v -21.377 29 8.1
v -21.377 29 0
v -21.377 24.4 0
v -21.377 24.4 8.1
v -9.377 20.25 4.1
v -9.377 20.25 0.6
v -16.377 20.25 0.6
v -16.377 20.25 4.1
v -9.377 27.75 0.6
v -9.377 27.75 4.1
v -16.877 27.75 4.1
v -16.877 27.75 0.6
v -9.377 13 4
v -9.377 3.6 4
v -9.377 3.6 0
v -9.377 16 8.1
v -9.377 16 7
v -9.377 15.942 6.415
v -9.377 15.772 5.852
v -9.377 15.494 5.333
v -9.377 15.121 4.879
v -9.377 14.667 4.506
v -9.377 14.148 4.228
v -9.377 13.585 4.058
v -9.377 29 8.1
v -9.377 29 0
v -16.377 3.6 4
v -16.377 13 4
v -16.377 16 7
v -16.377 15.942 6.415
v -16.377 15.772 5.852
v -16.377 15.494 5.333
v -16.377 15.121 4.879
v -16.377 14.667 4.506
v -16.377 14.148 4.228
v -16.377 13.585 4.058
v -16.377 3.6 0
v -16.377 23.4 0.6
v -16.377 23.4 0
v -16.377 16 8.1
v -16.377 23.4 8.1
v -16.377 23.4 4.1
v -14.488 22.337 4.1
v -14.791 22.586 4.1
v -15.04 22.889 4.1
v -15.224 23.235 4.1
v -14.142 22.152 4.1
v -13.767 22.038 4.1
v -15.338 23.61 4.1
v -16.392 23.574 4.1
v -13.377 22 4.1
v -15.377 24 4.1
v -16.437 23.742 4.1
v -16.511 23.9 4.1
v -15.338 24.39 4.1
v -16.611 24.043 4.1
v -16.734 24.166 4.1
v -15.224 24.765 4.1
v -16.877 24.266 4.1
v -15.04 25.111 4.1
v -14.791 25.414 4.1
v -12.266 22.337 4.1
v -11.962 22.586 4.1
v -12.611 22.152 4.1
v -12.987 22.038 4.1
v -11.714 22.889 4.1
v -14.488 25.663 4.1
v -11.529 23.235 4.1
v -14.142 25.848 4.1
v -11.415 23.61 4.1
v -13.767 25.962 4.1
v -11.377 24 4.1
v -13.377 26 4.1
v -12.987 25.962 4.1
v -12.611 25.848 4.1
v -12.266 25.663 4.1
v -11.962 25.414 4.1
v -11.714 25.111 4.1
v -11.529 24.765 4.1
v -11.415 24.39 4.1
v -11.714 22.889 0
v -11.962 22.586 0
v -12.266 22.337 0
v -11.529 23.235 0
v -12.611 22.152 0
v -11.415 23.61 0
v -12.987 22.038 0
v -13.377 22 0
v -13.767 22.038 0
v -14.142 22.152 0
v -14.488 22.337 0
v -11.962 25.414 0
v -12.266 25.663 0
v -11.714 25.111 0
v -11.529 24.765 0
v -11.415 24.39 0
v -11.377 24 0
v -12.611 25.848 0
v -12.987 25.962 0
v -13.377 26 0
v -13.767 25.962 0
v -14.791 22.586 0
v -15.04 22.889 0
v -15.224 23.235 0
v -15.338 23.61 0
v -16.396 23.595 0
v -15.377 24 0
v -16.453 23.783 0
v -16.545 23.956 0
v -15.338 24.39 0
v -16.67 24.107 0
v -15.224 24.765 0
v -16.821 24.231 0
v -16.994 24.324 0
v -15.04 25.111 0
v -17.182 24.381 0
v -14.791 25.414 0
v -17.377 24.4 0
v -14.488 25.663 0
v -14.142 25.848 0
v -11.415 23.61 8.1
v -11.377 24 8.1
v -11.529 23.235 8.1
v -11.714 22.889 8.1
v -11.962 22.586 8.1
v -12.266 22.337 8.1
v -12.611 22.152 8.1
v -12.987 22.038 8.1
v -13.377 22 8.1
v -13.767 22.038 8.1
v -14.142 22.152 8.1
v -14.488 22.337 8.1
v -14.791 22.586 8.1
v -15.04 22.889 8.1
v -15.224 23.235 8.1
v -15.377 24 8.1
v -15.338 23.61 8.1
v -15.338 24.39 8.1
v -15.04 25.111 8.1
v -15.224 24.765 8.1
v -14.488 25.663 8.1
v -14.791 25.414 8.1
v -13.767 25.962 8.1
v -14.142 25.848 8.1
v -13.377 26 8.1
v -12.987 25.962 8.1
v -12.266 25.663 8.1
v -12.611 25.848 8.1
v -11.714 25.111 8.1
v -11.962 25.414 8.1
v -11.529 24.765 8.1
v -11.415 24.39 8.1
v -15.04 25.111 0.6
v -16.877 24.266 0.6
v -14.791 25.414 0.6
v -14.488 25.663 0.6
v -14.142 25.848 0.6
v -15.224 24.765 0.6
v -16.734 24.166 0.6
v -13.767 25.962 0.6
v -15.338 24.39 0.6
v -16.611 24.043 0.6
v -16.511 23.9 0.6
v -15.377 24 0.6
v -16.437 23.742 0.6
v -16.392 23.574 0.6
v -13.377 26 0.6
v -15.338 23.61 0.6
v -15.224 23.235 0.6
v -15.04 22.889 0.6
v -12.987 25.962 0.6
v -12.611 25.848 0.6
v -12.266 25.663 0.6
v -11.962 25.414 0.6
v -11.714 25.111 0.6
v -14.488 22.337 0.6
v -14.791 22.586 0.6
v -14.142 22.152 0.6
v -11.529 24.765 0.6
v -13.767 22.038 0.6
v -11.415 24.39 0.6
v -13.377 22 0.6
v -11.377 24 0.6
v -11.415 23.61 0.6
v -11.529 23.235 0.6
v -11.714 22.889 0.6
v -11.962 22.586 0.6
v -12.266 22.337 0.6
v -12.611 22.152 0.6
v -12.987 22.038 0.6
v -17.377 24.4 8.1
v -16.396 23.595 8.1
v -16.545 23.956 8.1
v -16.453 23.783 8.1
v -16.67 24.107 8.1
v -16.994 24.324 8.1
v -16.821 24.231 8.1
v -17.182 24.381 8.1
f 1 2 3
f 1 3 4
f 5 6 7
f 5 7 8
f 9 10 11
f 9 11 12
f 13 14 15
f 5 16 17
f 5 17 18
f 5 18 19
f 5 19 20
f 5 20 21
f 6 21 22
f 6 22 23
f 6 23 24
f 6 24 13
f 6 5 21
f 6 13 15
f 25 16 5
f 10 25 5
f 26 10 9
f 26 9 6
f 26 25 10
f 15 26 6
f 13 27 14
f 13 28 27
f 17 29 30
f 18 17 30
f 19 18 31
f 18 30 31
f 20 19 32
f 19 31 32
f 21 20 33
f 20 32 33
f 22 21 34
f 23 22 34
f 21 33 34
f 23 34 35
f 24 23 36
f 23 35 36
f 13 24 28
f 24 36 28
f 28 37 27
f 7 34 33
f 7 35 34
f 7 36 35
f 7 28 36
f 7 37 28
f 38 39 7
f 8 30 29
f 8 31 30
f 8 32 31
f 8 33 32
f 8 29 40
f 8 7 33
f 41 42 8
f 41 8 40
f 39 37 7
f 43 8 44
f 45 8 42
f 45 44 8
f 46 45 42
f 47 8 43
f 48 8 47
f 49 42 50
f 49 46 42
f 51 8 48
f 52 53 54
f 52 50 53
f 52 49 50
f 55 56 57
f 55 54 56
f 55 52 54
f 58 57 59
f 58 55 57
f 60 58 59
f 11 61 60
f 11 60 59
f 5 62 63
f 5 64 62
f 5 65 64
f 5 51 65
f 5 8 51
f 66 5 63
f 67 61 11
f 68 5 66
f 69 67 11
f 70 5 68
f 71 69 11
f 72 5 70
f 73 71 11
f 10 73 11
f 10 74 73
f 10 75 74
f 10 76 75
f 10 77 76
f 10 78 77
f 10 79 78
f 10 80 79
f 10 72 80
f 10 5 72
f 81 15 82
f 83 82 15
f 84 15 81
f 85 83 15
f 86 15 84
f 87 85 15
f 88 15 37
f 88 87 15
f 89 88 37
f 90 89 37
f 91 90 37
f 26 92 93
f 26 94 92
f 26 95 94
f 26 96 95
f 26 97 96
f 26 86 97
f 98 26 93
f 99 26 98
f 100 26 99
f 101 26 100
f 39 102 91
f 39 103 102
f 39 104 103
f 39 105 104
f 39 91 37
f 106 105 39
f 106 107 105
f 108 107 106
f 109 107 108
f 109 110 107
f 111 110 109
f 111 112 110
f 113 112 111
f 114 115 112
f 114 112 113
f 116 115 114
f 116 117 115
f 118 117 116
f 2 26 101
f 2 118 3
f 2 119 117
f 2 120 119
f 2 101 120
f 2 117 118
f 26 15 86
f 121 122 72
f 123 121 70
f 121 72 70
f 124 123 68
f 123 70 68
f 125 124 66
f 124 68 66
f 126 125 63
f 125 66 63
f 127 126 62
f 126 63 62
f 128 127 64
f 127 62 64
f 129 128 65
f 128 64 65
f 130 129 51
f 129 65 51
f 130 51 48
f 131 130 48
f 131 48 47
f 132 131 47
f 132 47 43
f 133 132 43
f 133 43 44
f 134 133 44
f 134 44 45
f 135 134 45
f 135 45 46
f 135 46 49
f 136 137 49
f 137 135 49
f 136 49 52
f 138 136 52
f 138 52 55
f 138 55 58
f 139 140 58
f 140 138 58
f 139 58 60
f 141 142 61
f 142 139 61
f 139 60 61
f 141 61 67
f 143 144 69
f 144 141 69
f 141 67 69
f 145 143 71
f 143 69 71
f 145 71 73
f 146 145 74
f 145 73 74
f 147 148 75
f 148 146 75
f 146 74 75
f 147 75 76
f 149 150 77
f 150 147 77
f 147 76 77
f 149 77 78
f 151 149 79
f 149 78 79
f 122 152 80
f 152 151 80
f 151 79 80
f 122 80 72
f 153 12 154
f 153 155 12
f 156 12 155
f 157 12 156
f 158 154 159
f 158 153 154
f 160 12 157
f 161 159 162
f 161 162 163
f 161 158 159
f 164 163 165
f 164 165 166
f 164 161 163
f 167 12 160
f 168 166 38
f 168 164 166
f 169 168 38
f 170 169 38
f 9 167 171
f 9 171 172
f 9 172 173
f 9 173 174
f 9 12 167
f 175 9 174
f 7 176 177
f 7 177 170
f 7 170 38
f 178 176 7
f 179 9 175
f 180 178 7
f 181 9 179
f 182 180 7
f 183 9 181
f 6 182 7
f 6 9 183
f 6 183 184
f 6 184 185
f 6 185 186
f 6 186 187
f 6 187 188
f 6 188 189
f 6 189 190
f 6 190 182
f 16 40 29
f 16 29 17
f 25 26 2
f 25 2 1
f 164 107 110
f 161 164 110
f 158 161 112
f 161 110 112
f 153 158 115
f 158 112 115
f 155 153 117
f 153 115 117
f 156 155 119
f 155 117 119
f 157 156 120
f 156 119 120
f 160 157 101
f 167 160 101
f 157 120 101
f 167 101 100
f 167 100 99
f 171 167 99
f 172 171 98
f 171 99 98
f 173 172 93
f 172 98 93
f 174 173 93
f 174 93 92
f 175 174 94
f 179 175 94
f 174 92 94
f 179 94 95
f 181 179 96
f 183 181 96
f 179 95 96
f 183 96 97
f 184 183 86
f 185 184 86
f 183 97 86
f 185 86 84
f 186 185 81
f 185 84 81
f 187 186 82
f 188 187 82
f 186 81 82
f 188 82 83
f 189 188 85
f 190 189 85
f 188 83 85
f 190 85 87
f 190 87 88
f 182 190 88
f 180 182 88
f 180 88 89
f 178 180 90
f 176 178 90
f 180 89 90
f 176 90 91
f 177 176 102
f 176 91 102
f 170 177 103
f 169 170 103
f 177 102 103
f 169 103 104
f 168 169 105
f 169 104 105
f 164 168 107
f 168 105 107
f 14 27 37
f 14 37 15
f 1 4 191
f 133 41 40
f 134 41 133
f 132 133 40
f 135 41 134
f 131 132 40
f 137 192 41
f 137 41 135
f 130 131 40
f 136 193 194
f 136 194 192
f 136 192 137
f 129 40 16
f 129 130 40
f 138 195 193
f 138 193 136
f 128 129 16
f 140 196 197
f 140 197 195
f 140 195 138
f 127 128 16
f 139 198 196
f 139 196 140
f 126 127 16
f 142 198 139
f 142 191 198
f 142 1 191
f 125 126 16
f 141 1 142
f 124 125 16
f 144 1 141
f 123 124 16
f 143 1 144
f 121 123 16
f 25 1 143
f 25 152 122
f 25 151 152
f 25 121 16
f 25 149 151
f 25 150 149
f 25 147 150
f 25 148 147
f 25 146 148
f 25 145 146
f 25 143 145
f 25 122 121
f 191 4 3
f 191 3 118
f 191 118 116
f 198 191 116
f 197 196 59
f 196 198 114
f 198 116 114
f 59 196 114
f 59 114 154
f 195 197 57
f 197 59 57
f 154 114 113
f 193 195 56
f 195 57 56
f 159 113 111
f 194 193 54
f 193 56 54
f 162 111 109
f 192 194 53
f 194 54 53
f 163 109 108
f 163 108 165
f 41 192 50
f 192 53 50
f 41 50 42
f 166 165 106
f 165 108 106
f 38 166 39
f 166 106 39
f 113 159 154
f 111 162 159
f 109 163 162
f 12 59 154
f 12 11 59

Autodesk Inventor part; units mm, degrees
ref_plane "YZ Plane" through (0, 0, 0) normal (1, 0, 0) x (0, 1, 0)
sketch "Sketch1" plane through (0, 0, 0) normal (0, 0, 1) x (1, 0, 0)
  line L0 (5.8439, -14.5) -> (6.8, -14.5) projected
  line L1 (6.8, -5.5) -> (6.8, -14.5) projected
  line L2 (6.8, -5.5) -> (5.8439, -5.5) projected
  arc A0 (5.8439, -3.1) -> (5.8439, -5.5) centre (4, -4.3) ccw projected
  line L3 (5.8439, -3.1) -> (6.8, -3.1) projected
  line L4 (6.8, 0) -> (6.8, -3.1) projected
  line L5 (0, 0) -> (6.8, 0) projected
  line L6 (0, -20) -> (0, 0) projected
  line L7 (0, -20) -> (6.8, -20) projected
  line L8 (6.8, -16.9) -> (6.8, -20) projected
  line L9 (6.8, -16.9) -> (5.8439, -16.9) projected
  arc A1 (5.8439, -14.5) -> (5.8439, -16.9) centre (4, -15.7) ccw projected
  line L10 (-47.1, -14.5) -> (-46.1439, -14.5) projected
  arc A2 (-46.1439, -16.9) -> (-46.1439, -14.5) centre (-44.3, -15.7) ccw projected
  line L11 (-46.1439, -16.9) -> (-47.1, -16.9) projected
  line L12 (-47.1, -16.9) -> (-47.1, -20) projected
  line L13 (-40.3, -20) -> (-47.1, -20) projected
  line L14 (-40.3, 0) -> (-40.3, -20) projected
  line L15 (-40.3, 0) -> (-47.1, 0) projected
  line L16 (-47.1, 0) -> (-47.1, -3.1) projected
  line L17 (-47.1, -3.1) -> (-46.1439, -3.1) projected
  arc A3 (-46.1439, -5.5) -> (-46.1439, -3.1) centre (-44.3, -4.3) ccw projected
  line L18 (-46.1439, -5.5) -> (-47.1, -5.5) projected
  line L19 (-47.1, -5.5) -> (-47.1, -14.5) projected
extrude "Extrusion1" add sketch "Sketch1" along normal blind 4
sketch "Sketch2" plane through (0, 0, 0) normal (0, 1, 0) x (1, 0, 0)
  line L0 (0, 0) -> (6.8, 0) projected
  line L1 (0, 0) -> (0, -4) projected
  line L2 (6.8, -4) -> (0, -4) projected
  line L3 (6.8, 0) -> (6.8, -4) projected
  line L4 (-47.1, 0) -> (-47.1, -4) projected
  line L5 (-40.3, -4) -> (-47.1, -4) projected
  line L6 (6.8, 0) -> (-47.1, 0)
  line L7 (-47.1, 0) -> (-47.1, -4)
  line L8 (-47.1, -4) -> (6.8, -4)
  line L9 (6.8, -4) -> (6.8, 0)
extrude "Extrusion2" add sketch "Sketch2" along normal blind 4 contours L1 L8 L5 L4 L6
sketch "Sketch3" plane through (0, 0, 4) normal (1, 0, 0) x (0, 0, -1)
  line L0 (4, 0) -> (0, 0) projected
  line L1 (4, 4) -> (4, 0) projected
  line L2 (0, 4) -> (4, 4) projected
  line L3 (0, 0) -> (0, 4) projected
extrude "Extrusion3" add sketch "Sketch3" along normal up to surface (6.8 mm away)
sketch "Sketch4" plane through (0, 4, 0) normal (0, 1, 0) x (1, 0, 0)
  line L0 (6.8, 0) -> (-47.1, 0) projected
  line L1 (-47.1, -4) -> (6.8, -4) projected
  line L2 (-9.3767, -8.1) -> (-9.3767, -13.1) construction
  line L3 (-21.8189, -8.1) -> (-9.3767, -8.1) construction
  arc A0 (-17.3767, -8.1) -> (-40.8, 16.4941) centre (-48.3, -14.1) ccw construction
  line L4 (-9.3767, -4) -> (-16.3767, -4) construction
  line L5 (-16.3767, -4) -> (-16.3767, -8.1) construction
  line L6 (-16.3767, -8.1) -> (-9.3767, -8.1) construction
  line L7 (-9.3767, -8.1) -> (-9.3767, -4) construction
  line L8 (-9.3767, -4) -> (-16.3767, -4)
  line L9 (-16.3767, -4) -> (-16.3767, 0)
  line L10 (-16.3767, 0) -> (-9.3767, 0)
  line L11 (-9.3767, 0) -> (-9.3767, -4)
  point P0 (0, 0)
  dimension "d6" = 7
ref_plane "Work Plane1" through (-21.8189, 29, 8.1) normal (0, 1, 0) x (0, 0, 1)
extrude "Extrusion4" add sketch "Sketch4" along normal up to surface (25 mm away)
sketch "Sketch5" plane through (0, 0, 4) normal (0, 0, 1) x (1, 0, 0)
  circle A0 centre (-13.3767, 24) radius 2 construction
  line L0 (-21.8189, 24) -> (-17.3767, 24) construction
  line L1 (-21.8189, 24) -> (-21.8189, 29) construction
  line L2 (-21.8189, 29) -> (-9.3767, 29) construction
  line L3 (-9.3767, 19) -> (-9.3767, 29) construction
  line L4 (-17.3767, 19) -> (-9.3767, 19) construction
  line L5 (-17.3767, 24) -> (-17.3767, 19) construction
  line L6 (-9.3767, 19) -> (-16.3767, 19) construction
  line L7 (-16.3767, 19) -> (-16.3767, 29) construction
  line L8 (-16.3767, 29) -> (-9.3767, 29) construction
  line L9 (-9.3767, 29) -> (-9.3767, 19) construction
  line L10 (-9.3767, 19) -> (-16.3767, 19)
  line L11 (-16.3767, 19) -> (-16.3767, 29)
  line L12 (-16.3767, 29) -> (-9.3767, 29)
  line L13 (-9.3767, 29) -> (-9.3767, 19)
  circle A1 centre (-13.3767, 24) radius 2
ref_plane "Work Plane2" through (-21.8189, 19, 8.1) normal (0, 0, -1) x (0, 1, 0)
extrude "Extrusion5" add sketch "Sketch5" along normal up to surface (4.1 mm away)
fillet "Fillet2" radius 2 2 edges at (-9.3767, 4, 2) (-16.3767, 4, 2)
sketch "Sketch6" plane through (-16.3767, 19, 8.1) normal (-1, 0, 0) x (0, 0, 1)
  line L0 (0, 5) -> (-24.5941, 5) construction
  line L1 (0, 0) -> (-24.5941, 0) construction
  line L2 (-8.1, 10) -> (0.5132, 10) construction
  line L3 (0.5132, 10) -> (0.5132, 5) construction
  line L4 (0.5132, 5) -> (-8.1, 5) construction
  line L5 (-8.1, 5) -> (-8.1, 10) construction
  line L6 (-8.1, 10) -> (0, 10)
  line L7 (0, 10) -> (0, 5)
  line L8 (0, 5) -> (-8.1, 5)
  line L9 (-8.1, 5) -> (-8.1, 10)
  point P0 (-8.1, -19)
extrude "Extrusion6" add sketch "Sketch6" along normal blind 5
sketch "Sketch7" plane through (-16.3767, 24, 0) normal (0, -1, 0) x (1, 0, 0)
  line L0 (0, 8.1) -> (0, 0) projected
  line L1 (0, 8.1) -> (-5, 8.1) projected
  line L2 (-5, 0) -> (-5, 8.1) projected
  line L3 (0, 0) -> (-5, 0) projected
  point P0 (16.3767, 0)
extrude "Extrusion7" cut sketch "Sketch7" against normal blind 0.4
sketch "Sketch8" plane through (0, 0, 0) normal (0, 0, -1) x (-1, 0, 0)
  circle A0 centre (13.3767, 24) radius 2 construction
  circle A1 centre (13.3767, 24) radius 2 projected
extrude "Extrusion8" cut sketch "Sketch8" against normal blind 4
fillet "Fillet3" radius 1 1 edges at (-16.3767, 24.4, 4.05)
sketch "Sketch9" plane through (-9.3767, 19, 8.1) normal (1, 0, 0) x (0, 0, -1)
  line L0 (0, 0) -> (0, 10) projected
  line L1 (8.1, 7) -> (0, 7) construction
  line L2 (8.1, 3) -> (0, 3) construction
  line L3 (24.5941, 5) -> (0, 5) construction
  line L4 (-5, 5) -> (0, 5) construction
  line L5 (4, 8.75) -> (7.5, 8.75)
  line L6 (7.5, 8.75) -> (7.5, 1.25)
  line L7 (7.5, 1.25) -> (4, 1.25)
  line L8 (4, 1.25) -> (4, 8.75)
  point P0 (8.1, -19)
  point P1 (4, 5)
  dimension "d20" = 3.5
  dimension "d21" = 7.5
  dimension "d22" = 4
extrude "Extrusion9" cut sketch "Sketch9" against normal blind 7.5
sketch "Sketch10" plane through (-16.3767, 19, 4) normal (0, -1, 0) x (1, 0, 0)
  line L0 (0, 4.1) -> (7, 4.1) projected
  line L1 (0, 0) -> (0, 4.1) projected
  line L2 (7, 0) -> (0, 0) projected
  line L3 (7, 0) -> (7, 4.1) projected
  point P0 (16.3767, -4)
extrude "Extrusion10" add sketch "Sketch10" along normal blind 3
fillet "Fillet4" radius 3 1 edges at (-12.8767, 16, 4)
sketch "Sketch11" plane through (0, 0, 0) normal (0, -1, 0) x (1, 0, 0)
  line L0 (-40.3, 0) -> (-40.3, 4) projected
  line L1 (0, 0) -> (-40.3, 0) projected
  line L2 (0, 0) -> (0, 4) projected
  line L3 (-40.3, 4) -> (0, 4) projected
extrude "Extrusion11" cut sketch "Sketch11" against normal blind 0.3
sketch "Sketch12" plane through (0, -20, 0) normal (-1, 0, 0) x (0, 0, 1)
  line L0 (0, 0) -> (0, 20.3) projected
  line L1 (0, 0) -> (4, 0) projected
  line L2 (4, 20.3) -> (4, 0) projected
  line L3 (4, 20.3) -> (0, 20.3) projected
  point P0 (0, 20)
extrude "Extrusion12" cut sketch "Sketch12" against normal blind 0.3
sketch "Sketch13" plane through (-40.3, -20, 4) normal (1, 0, 0) x (0, 0, -1)
  line L0 (4, 0) -> (4, 20.3) projected
  line L1 (4, 20.3) -> (0, 20.3) projected
  line L2 (0, 0) -> (0, 20.3) projected
  line L3 (4, 0) -> (0, 0) projected
  point P0 (4, 20)
extrude "Extrusion13" cut sketch "Sketch13" against normal blind 0.3
fillet "Fillet5" radius 1 2 edges at (6.8, 4, 2) (-47.1, 4, 2)
sketch "Sketch15" plane through (0, 0, 4) normal (0, 0, 1) x (1, 0, 0)
  line L0 (-46.1, 4) -> (-18.3767, 4) projected
  line L1 (13.0867, -24.6558) -> (-51.2218, -24.6558)
  line L2 (-51.2218, -24.6558) -> (-51.2218, 7)
  line L3 (-51.2218, 7) -> (13.0867, 7)
  line L4 (13.0867, 7) -> (13.0867, -24.6558)
  point P0 (0, 0)
  dimension "d35" = 3
extrude "Extrusion14" cut sketch "Sketch15" against normal through all
sketch "Sketch16" plane through (-16.3767, 7, 4) normal (0, -1, 0) x (1, 0, 0)
  line L0 (7, 0) -> (7, -4) projected
  line L1 (0, 0) -> (7, 0) projected
  line L2 (0, -4) -> (0, 0) projected
  line L3 (7, -4) -> (0, -4) projected
  point P0 (16.3767, -4)
extrude "Extrusion15" add sketch "Sketch16" along normal blind 3.4
properties part number "MG996RBracketBottom"
